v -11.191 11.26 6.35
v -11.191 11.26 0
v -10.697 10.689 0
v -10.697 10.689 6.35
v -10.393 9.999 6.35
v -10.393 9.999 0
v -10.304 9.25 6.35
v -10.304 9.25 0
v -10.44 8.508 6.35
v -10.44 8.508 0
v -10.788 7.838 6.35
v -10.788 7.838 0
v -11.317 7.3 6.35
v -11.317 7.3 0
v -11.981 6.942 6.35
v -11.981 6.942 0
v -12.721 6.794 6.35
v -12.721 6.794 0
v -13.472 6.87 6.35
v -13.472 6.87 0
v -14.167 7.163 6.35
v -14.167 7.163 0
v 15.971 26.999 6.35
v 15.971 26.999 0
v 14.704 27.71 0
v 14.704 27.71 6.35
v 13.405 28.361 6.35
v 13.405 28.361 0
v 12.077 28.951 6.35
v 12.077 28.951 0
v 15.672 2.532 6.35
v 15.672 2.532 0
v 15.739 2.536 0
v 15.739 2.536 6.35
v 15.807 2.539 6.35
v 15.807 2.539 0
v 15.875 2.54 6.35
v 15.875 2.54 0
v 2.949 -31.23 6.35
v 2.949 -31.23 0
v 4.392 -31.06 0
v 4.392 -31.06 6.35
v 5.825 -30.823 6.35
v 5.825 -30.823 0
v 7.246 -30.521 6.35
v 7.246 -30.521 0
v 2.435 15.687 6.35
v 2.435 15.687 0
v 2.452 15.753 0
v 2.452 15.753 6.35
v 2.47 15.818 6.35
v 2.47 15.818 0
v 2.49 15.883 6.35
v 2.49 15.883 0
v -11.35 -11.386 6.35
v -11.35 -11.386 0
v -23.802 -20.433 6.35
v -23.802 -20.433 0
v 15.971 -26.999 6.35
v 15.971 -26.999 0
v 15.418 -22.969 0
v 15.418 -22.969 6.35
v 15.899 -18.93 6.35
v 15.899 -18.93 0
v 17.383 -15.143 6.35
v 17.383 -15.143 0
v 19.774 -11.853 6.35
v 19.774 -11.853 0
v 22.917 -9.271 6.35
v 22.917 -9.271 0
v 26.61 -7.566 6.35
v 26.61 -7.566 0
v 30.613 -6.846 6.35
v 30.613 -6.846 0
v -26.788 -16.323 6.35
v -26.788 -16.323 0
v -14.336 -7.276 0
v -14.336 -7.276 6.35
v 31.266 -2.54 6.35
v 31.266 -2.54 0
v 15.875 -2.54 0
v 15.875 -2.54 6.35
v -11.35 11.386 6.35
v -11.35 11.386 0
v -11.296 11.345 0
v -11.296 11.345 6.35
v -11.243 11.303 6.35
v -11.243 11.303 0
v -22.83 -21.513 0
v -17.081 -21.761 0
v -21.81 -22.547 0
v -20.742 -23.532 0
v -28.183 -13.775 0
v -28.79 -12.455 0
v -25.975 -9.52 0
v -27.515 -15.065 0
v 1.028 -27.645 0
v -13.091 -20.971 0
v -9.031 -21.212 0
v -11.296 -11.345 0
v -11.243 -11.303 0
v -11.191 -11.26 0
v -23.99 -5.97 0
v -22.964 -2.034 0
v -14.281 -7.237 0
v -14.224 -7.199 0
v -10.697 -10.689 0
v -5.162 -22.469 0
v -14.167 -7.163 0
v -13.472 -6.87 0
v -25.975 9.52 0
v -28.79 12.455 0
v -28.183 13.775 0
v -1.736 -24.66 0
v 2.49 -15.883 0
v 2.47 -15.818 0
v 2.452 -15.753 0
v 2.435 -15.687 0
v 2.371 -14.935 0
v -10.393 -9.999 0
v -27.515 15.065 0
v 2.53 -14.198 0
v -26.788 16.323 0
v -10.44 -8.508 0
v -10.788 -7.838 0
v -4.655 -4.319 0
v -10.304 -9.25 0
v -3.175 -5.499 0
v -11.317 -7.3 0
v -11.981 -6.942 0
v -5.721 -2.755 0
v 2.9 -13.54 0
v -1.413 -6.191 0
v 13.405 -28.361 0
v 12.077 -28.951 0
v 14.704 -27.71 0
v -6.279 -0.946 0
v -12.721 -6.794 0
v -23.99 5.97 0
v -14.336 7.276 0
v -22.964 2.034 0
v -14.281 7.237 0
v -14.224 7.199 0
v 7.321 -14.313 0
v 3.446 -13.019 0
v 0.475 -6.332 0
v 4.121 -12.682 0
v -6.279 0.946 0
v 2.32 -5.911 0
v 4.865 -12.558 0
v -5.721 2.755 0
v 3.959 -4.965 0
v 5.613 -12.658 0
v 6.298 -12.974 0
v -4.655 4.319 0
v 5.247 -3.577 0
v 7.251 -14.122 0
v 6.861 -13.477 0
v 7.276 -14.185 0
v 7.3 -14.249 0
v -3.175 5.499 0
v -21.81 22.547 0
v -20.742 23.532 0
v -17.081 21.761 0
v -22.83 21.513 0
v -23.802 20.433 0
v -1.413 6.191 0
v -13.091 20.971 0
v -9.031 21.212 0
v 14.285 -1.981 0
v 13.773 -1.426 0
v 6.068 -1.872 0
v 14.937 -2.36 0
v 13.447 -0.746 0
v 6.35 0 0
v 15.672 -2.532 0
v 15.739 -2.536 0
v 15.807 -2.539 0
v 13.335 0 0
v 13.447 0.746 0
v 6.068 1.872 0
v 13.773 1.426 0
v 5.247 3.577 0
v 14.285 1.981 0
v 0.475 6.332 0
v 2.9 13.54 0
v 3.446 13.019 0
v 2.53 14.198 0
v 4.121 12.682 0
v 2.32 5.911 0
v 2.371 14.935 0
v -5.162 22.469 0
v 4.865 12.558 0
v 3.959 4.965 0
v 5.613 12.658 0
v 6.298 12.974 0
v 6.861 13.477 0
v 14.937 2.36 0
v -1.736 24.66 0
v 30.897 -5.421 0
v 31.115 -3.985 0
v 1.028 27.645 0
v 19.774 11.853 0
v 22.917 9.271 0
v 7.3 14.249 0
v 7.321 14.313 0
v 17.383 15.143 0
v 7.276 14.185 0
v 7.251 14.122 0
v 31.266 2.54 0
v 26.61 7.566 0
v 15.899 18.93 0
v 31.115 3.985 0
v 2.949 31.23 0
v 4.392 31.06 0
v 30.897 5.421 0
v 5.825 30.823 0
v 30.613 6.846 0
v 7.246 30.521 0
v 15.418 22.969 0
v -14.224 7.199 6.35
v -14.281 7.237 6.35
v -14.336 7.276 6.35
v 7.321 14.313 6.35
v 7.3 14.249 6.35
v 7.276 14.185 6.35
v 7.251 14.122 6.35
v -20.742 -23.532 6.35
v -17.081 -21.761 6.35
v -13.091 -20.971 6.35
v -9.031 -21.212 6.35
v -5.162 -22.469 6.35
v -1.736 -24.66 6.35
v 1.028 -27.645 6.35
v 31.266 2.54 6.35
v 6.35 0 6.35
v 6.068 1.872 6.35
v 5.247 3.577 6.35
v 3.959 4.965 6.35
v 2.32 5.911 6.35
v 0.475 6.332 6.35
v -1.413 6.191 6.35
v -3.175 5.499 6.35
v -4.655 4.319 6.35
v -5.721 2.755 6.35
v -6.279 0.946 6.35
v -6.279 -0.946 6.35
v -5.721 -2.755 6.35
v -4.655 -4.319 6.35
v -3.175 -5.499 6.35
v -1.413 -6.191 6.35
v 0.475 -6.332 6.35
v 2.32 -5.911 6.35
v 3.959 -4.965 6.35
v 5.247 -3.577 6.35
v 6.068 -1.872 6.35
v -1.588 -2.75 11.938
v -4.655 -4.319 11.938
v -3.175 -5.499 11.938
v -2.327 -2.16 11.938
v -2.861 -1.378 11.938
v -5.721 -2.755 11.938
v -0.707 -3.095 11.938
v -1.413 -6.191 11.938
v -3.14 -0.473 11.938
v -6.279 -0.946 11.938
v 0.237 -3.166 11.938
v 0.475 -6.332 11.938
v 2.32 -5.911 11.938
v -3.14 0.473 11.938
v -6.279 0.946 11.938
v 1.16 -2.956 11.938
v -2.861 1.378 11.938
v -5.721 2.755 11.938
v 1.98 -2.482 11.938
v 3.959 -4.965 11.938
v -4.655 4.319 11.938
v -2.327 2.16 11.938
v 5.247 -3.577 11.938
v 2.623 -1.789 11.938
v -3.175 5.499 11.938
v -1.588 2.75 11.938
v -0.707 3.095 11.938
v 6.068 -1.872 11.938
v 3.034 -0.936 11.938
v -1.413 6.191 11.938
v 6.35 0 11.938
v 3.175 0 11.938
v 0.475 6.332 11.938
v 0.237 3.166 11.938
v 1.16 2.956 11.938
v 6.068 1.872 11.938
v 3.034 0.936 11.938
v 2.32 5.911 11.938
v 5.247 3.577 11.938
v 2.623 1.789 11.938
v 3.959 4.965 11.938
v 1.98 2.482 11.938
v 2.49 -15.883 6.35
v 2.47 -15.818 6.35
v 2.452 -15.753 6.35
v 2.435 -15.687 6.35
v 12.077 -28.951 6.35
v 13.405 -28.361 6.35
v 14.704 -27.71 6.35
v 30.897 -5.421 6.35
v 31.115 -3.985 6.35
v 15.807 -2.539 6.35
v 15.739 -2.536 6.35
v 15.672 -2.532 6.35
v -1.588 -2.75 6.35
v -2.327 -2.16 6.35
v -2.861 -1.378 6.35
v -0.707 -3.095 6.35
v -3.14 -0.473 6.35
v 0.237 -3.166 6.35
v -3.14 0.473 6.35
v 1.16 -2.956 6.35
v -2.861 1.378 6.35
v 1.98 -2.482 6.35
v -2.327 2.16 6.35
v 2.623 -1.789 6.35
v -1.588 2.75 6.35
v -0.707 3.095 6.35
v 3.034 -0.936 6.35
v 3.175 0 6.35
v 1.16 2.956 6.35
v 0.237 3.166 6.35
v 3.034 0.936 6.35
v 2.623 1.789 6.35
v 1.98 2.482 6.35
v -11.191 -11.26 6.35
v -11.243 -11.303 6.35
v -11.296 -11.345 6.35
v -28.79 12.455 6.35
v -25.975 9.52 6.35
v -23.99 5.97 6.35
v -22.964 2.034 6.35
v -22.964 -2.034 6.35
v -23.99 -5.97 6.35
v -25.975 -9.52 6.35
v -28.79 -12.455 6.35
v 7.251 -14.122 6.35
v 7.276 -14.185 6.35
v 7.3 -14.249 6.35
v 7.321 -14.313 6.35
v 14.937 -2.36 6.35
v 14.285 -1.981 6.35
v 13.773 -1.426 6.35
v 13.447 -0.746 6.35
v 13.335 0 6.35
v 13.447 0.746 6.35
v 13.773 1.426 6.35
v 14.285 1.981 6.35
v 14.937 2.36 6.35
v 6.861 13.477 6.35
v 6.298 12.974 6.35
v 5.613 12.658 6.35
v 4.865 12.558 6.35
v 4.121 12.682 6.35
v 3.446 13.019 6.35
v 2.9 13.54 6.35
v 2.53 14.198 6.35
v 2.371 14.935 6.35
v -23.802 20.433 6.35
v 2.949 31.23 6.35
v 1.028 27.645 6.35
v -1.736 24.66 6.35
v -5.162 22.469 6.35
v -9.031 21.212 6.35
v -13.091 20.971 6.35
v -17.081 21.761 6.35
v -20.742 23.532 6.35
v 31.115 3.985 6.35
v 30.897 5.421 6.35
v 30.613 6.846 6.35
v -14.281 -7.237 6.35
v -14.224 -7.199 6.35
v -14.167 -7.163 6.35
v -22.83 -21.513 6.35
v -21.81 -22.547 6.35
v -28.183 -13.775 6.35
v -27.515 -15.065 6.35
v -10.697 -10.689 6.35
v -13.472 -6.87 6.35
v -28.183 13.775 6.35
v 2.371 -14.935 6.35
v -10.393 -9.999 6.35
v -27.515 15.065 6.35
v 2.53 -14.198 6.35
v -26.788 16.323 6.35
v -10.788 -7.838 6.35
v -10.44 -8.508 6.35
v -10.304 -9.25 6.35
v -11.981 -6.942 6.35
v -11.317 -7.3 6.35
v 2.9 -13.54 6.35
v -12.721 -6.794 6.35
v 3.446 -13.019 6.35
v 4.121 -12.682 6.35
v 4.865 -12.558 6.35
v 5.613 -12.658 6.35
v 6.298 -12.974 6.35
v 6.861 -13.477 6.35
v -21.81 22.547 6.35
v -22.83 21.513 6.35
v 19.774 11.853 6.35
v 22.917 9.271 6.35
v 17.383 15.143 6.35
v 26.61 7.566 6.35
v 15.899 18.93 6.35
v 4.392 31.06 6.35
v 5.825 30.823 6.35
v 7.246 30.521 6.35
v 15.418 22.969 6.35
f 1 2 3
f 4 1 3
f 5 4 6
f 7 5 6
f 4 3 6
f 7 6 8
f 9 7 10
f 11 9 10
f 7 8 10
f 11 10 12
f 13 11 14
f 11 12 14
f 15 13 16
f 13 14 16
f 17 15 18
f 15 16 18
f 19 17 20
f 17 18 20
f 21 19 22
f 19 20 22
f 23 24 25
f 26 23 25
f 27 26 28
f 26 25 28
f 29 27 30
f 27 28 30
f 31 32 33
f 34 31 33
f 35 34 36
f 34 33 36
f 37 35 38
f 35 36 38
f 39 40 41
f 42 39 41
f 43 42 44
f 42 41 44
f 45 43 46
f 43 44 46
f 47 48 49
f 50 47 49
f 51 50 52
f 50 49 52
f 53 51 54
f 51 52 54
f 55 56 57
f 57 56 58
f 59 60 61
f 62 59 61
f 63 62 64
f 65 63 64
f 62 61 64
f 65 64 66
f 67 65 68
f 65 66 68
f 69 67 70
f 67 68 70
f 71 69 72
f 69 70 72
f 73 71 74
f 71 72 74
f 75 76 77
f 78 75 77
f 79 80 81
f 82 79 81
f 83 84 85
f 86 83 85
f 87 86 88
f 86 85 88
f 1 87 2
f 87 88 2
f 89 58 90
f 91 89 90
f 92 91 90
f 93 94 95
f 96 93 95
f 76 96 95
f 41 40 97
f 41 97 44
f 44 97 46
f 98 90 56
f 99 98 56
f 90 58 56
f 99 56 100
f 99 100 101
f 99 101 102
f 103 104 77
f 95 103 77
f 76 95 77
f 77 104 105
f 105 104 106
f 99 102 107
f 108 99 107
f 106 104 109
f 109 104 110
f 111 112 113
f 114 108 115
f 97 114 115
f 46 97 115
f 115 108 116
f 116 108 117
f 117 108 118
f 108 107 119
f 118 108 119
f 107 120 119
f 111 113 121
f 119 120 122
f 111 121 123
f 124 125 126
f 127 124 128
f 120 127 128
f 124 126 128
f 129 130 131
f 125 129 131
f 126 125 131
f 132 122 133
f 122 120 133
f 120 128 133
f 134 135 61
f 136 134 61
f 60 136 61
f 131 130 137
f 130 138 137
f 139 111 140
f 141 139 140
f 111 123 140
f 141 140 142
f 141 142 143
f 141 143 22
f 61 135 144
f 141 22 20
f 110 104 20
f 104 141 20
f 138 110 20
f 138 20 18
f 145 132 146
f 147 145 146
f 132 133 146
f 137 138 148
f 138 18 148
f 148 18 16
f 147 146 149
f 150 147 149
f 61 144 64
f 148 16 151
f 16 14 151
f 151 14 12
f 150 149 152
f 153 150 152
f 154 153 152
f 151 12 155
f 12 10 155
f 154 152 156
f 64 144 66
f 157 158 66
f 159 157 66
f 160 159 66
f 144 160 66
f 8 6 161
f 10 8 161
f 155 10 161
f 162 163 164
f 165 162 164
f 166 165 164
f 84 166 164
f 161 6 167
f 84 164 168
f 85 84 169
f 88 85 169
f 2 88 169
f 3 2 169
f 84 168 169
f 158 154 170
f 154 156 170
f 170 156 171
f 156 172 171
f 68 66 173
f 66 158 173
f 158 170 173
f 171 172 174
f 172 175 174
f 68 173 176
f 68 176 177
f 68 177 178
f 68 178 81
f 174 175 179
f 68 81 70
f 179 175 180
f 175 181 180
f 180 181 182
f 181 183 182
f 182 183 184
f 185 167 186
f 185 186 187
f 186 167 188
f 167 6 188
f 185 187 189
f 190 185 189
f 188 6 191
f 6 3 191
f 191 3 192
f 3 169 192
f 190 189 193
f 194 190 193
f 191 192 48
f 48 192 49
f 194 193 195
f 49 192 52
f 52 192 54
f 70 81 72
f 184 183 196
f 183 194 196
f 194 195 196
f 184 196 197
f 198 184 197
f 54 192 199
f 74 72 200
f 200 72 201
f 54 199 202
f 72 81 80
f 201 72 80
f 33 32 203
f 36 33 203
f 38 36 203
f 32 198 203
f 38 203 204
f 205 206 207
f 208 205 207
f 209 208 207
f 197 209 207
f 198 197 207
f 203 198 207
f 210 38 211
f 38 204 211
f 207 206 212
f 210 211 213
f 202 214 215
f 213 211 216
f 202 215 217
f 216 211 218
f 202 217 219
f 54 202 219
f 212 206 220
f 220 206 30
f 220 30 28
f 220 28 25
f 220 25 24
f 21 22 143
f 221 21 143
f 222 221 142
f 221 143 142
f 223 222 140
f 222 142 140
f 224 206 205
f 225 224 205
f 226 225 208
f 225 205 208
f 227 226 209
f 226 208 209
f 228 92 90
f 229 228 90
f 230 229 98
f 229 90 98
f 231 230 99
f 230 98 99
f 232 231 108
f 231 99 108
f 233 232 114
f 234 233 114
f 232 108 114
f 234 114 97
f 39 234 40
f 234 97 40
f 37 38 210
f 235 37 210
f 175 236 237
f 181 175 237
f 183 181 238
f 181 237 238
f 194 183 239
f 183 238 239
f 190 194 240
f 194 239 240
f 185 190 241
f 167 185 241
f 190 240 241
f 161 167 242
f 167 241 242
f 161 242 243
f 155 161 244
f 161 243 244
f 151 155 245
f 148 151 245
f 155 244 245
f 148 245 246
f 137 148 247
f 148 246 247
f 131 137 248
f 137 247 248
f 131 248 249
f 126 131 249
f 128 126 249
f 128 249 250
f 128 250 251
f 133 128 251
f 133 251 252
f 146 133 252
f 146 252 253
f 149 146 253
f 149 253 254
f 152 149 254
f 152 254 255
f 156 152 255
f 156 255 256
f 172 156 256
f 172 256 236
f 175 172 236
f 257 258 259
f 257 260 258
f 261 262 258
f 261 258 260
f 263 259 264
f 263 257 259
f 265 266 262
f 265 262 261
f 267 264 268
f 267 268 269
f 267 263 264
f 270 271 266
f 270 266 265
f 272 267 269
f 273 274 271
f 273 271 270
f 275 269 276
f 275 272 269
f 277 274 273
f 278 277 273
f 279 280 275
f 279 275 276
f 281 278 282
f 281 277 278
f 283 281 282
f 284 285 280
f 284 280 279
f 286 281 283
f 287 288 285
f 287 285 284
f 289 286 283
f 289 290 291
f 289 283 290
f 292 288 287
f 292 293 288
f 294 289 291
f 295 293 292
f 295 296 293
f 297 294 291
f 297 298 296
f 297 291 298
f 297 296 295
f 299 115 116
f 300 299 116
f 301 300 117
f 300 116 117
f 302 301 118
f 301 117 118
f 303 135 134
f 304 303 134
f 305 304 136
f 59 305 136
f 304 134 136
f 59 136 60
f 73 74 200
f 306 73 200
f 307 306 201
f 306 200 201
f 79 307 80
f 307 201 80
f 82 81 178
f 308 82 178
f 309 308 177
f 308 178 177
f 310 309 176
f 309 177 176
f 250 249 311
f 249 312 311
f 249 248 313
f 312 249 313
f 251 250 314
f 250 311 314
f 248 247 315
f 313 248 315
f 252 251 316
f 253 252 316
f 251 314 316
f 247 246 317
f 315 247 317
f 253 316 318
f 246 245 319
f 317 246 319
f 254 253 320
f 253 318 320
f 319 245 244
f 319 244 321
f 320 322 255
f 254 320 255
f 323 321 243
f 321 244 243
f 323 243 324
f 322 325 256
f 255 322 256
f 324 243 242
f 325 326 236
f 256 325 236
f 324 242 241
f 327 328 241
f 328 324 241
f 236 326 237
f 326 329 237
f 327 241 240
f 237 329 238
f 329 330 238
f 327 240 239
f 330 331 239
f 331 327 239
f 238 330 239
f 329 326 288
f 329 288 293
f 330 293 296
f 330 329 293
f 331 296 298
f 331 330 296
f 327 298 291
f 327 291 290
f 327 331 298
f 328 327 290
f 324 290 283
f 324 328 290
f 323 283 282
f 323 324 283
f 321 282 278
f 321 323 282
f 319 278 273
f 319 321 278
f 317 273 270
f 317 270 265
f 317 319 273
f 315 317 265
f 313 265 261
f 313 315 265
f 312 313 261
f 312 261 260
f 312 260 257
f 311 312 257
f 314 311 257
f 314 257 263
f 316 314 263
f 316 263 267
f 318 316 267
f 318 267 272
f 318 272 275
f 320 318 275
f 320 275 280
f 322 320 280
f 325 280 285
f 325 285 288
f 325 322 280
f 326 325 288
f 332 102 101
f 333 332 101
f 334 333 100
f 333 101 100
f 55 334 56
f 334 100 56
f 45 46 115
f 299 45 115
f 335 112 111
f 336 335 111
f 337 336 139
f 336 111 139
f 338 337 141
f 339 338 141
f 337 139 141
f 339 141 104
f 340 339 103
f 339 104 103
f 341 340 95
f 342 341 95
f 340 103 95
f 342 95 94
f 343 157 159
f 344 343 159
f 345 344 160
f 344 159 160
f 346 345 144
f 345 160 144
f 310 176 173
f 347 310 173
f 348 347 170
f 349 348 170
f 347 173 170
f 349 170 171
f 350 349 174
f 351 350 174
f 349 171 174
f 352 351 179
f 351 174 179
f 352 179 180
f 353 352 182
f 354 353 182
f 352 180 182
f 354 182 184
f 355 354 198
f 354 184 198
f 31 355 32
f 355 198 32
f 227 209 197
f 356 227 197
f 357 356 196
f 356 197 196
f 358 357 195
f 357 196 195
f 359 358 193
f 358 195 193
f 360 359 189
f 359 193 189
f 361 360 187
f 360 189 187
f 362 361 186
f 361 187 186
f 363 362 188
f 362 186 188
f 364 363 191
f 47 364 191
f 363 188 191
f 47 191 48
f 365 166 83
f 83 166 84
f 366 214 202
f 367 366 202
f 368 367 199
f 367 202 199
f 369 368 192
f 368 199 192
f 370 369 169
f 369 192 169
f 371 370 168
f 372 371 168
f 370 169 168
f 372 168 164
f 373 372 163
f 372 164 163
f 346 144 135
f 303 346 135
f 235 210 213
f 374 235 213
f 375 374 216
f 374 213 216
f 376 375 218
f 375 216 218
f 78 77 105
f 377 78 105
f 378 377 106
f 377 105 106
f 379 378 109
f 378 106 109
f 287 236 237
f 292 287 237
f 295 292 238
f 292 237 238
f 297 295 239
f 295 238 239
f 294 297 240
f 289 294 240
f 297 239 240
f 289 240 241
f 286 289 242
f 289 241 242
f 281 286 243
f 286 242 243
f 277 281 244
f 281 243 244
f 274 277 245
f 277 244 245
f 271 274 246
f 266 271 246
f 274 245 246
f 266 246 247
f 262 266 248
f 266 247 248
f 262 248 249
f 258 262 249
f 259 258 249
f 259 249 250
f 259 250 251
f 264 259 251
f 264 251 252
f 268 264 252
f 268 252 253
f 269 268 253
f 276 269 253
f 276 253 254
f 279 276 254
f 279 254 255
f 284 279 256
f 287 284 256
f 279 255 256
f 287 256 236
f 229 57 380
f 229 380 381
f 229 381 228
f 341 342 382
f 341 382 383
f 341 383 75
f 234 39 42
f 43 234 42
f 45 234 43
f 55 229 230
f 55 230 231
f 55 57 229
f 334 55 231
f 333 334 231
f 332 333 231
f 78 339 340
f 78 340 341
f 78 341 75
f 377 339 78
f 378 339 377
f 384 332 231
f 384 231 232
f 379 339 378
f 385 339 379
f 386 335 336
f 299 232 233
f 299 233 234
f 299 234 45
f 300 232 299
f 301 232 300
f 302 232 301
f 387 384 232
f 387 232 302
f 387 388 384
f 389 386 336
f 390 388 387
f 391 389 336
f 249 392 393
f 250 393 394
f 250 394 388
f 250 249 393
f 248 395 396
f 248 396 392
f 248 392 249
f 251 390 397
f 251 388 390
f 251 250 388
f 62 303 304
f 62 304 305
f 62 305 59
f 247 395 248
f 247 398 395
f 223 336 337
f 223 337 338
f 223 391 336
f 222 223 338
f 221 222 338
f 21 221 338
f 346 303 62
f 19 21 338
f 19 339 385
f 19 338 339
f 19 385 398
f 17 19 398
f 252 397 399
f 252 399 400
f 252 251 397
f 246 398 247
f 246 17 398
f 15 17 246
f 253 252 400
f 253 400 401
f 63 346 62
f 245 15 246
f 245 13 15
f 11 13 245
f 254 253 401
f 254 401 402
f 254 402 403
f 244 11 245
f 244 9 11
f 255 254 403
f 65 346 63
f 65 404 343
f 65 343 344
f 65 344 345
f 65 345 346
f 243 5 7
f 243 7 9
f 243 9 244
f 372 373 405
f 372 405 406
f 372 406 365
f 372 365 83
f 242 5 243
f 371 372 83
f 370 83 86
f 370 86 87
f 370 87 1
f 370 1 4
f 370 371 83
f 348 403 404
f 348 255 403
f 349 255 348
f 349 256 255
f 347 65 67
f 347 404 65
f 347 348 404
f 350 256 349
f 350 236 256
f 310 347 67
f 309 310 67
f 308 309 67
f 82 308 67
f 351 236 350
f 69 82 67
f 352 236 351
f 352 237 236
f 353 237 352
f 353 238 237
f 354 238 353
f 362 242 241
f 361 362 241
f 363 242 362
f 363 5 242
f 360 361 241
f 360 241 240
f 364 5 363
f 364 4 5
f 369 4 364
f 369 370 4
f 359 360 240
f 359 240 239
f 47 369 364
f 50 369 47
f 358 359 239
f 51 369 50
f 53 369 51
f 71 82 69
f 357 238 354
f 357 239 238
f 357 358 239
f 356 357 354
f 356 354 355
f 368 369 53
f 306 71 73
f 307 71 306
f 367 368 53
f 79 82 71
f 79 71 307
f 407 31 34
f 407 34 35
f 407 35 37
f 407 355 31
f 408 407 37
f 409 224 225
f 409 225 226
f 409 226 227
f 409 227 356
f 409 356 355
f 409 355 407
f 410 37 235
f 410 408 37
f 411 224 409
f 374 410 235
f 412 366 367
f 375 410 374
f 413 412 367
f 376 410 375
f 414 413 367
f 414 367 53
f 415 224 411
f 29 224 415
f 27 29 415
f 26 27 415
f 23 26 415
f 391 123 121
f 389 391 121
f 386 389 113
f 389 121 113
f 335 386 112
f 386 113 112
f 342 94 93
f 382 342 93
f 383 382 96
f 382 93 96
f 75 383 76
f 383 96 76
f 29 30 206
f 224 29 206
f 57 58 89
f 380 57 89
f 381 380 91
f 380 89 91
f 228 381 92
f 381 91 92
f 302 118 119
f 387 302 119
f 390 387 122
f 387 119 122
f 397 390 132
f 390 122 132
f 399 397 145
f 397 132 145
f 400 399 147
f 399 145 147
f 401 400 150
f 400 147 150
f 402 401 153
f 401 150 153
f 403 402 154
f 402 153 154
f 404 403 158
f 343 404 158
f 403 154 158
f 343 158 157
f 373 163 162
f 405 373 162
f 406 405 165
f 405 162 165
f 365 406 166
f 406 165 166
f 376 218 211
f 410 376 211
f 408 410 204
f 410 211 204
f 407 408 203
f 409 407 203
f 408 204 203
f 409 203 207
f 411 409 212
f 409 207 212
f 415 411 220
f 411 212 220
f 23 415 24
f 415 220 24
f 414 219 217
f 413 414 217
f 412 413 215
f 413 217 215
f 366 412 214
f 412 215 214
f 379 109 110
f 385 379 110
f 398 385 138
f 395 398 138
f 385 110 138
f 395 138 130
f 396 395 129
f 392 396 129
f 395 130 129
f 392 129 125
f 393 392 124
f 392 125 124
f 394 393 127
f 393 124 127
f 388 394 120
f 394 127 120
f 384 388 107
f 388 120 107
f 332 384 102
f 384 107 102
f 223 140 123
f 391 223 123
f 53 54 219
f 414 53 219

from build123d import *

# Parameters (mm, degrees)
BOSS_EXTRUDE1_DEPTH = 6.35
SKETCH2_R           = 6.35
SKETCH2_R_2         = 3.175
BOSS_EXTRUDE2_DEPTH = 5.588
SKETCH2_2_R         = 6.35
SKETCH2_2_R_2       = 3.175
CUT_EXTRUDE1_DEPTH  = 45.645295473


with BuildPart() as part:
    # Sketch1 → Boss-Extrude1 (new body)
    with BuildSketch(Plane.XY):
        with BuildLine():
            ThreePointArc((15.6718, 2.531858953), (15.773318492, 2.537963922), (15.875, 2.54))
            Line((15.875, 2.54), (31.265996882, 2.54))
            ThreePointArc((31.265996882, 2.54), (31.014248813, 4.704309891), (30.612864998, 6.845922701))
            ThreePointArc((30.612864998, 6.845922701), (18.47357946, 13.421841122), (15.970754926, 26.999058282))
            ThreePointArc((15.970754926, 26.999058282), (14.057994528, 28.042591729), (12.077407934, 28.950826907))
            Line((12.077407934, 28.950826907), (7.321328337, 14.31311903))
            ThreePointArc((7.321328337, 14.31311903), (7.287970598, 14.217043352), (7.250793488, 14.122380068))
            ThreePointArc((7.250793488, 14.122380068), (4.12074162, 12.682338645), (2.434911576, 15.687154956))
            ThreePointArc((2.434911576, 15.687154956), (2.460476345, 15.785591318), (2.489961234, 15.882925362))
            Line((2.489961234, 15.882925362), (7.246040831, 30.520633238))
            ThreePointArc((7.246040831, 30.520633238), (5.109865374, 30.950015135), (2.949036136, 31.230071195))
            ThreePointArc((2.949036136, 31.230071195), (-7.05627946, 21.716995127), (-20.742395628, 23.532258383))
            ThreePointArc((-20.742395628, 23.532258383), (-22.325930381, 22.035584712), (-23.801748282, 20.432595031))
            Line((-23.801748282, 20.432595031), (-11.350170245, 11.385994046))
            ThreePointArc((-11.350170245, 11.385994046), (-11.269104953, 11.324579933), (-11.190563179, 11.259969838))
            ThreePointArc((-11.190563179, 11.259969838), (-10.78824162, 7.838116339), (-14.166941886, 7.163335996))
            ThreePointArc((-14.166941886, 7.163335996), (-14.252660482, 7.218068045), (-14.336119327, 7.276187714))
            Line((-14.336119327, 7.276187714), (-26.787697364, 16.3227887))
            ThreePointArc((-26.787697364, 16.3227887), (-27.856178334, 14.423851415), (-28.790260432, 12.455322769))
            ThreePointArc((-28.790260432, 12.455322769), (-22.8346, 0), (-28.790260432, -12.455322769))
            ThreePointArc((-28.790260432, -12.455322769), (-27.856178334, -14.423851415), (-26.787697364, -16.3227887))
            Line((-26.787697364, -16.3227887), (-14.336119327, -7.276187714))
            ThreePointArc((-14.336119327, -7.276187714), (-14.252660482, -7.218068045), (-14.166941886, -7.163335996))
            ThreePointArc((-14.166941886, -7.163335996), (-10.78824162, -7.838116339), (-11.190563179, -11.259969838))
            ThreePointArc((-11.190563179, -11.259969838), (-11.269104953, -11.324579933), (-11.350170245, -11.385994046))
            Line((-11.350170245, -11.385994046), (-23.801748282, -20.432595031))
            ThreePointArc((-23.801748282, -20.432595031), (-22.325930381, -22.035584712), (-20.742395628, -23.532258383))
            ThreePointArc((-20.742395628, -23.532258383), (-7.05627946, -21.716995127), (2.949036136, -31.230071195))
            ThreePointArc((2.949036136, -31.230071195), (5.109865374, -30.950015135), (7.246040831, -30.520633238))
            Line((7.246040831, -30.520633238), (2.489961234, -15.882925362))
            ThreePointArc((2.489961234, -15.882925362), (2.460476345, -15.785591318), (2.434911576, -15.687154956))
            ThreePointArc((2.434911576, -15.687154956), (4.12074162, -12.682338645), (7.250793488, -14.122380068))
            ThreePointArc((7.250793488, -14.122380068), (7.287970598, -14.217043352), (7.321328337, -14.31311903))
            Line((7.321328337, -14.31311903), (12.077407934, -28.950826907))
            ThreePointArc((12.077407934, -28.950826907), (14.057994528, -28.042591729), (15.970754926, -26.999058282))
            ThreePointArc((15.970754926, -26.999058282), (18.47357946, -13.421841122), (30.612864998, -6.845922701))
            ThreePointArc((30.612864998, -6.845922701), (31.014248813, -4.704309891), (31.265996882, -2.54))
            Line((31.265996882, -2.54), (15.875, -2.54))
            ThreePointArc((15.875, -2.54), (15.773318492, -2.537963922), (15.6718, -2.531858953))
            ThreePointArc((15.6718, -2.531858953), (13.335, 0), (15.6718, 2.531858953))
        make_face()
    extrude(amount=BOSS_EXTRUDE1_DEPTH)

    # Sketch2 → Boss-Extrude2 (add)
    with BuildSketch(Plane.XY.offset(6.35)):
        Circle(SKETCH2_R)
        Circle(SKETCH2_R_2, mode=Mode.SUBTRACT)
    extrude(amount=BOSS_EXTRUDE2_DEPTH)

    # Sketch2<2> → Cut-Extrude1 (cut, through all)
    with BuildSketch(Plane.XY.offset(6.35)):
        Circle(SKETCH2_2_R)
        Circle(SKETCH2_2_R_2, mode=Mode.SUBTRACT)
    extrude(amount=-CUT_EXTRUDE1_DEPTH, mode=Mode.SUBTRACT)


with BuildPart() as cut_extrude1_piece_1:
    # of the separate pieces the step leaves, piece 1, a body of its own (cut_extrude1_pieces_kept)
    add(part.part.solids().sort_by_distance((-14.336119327, -7.276187714, 0))[0])


with BuildPart() as cut_extrude1_piece_2:
    # of the separate pieces the step leaves, piece 2, a body of its own (cut_extrude1_pieces_kept)
    add(part.part.solids().sort_by_distance((6.35, 0, 11.938))[0])


solid = Compound([cut_extrude1_piece_1.part, cut_extrude1_piece_2.part])
